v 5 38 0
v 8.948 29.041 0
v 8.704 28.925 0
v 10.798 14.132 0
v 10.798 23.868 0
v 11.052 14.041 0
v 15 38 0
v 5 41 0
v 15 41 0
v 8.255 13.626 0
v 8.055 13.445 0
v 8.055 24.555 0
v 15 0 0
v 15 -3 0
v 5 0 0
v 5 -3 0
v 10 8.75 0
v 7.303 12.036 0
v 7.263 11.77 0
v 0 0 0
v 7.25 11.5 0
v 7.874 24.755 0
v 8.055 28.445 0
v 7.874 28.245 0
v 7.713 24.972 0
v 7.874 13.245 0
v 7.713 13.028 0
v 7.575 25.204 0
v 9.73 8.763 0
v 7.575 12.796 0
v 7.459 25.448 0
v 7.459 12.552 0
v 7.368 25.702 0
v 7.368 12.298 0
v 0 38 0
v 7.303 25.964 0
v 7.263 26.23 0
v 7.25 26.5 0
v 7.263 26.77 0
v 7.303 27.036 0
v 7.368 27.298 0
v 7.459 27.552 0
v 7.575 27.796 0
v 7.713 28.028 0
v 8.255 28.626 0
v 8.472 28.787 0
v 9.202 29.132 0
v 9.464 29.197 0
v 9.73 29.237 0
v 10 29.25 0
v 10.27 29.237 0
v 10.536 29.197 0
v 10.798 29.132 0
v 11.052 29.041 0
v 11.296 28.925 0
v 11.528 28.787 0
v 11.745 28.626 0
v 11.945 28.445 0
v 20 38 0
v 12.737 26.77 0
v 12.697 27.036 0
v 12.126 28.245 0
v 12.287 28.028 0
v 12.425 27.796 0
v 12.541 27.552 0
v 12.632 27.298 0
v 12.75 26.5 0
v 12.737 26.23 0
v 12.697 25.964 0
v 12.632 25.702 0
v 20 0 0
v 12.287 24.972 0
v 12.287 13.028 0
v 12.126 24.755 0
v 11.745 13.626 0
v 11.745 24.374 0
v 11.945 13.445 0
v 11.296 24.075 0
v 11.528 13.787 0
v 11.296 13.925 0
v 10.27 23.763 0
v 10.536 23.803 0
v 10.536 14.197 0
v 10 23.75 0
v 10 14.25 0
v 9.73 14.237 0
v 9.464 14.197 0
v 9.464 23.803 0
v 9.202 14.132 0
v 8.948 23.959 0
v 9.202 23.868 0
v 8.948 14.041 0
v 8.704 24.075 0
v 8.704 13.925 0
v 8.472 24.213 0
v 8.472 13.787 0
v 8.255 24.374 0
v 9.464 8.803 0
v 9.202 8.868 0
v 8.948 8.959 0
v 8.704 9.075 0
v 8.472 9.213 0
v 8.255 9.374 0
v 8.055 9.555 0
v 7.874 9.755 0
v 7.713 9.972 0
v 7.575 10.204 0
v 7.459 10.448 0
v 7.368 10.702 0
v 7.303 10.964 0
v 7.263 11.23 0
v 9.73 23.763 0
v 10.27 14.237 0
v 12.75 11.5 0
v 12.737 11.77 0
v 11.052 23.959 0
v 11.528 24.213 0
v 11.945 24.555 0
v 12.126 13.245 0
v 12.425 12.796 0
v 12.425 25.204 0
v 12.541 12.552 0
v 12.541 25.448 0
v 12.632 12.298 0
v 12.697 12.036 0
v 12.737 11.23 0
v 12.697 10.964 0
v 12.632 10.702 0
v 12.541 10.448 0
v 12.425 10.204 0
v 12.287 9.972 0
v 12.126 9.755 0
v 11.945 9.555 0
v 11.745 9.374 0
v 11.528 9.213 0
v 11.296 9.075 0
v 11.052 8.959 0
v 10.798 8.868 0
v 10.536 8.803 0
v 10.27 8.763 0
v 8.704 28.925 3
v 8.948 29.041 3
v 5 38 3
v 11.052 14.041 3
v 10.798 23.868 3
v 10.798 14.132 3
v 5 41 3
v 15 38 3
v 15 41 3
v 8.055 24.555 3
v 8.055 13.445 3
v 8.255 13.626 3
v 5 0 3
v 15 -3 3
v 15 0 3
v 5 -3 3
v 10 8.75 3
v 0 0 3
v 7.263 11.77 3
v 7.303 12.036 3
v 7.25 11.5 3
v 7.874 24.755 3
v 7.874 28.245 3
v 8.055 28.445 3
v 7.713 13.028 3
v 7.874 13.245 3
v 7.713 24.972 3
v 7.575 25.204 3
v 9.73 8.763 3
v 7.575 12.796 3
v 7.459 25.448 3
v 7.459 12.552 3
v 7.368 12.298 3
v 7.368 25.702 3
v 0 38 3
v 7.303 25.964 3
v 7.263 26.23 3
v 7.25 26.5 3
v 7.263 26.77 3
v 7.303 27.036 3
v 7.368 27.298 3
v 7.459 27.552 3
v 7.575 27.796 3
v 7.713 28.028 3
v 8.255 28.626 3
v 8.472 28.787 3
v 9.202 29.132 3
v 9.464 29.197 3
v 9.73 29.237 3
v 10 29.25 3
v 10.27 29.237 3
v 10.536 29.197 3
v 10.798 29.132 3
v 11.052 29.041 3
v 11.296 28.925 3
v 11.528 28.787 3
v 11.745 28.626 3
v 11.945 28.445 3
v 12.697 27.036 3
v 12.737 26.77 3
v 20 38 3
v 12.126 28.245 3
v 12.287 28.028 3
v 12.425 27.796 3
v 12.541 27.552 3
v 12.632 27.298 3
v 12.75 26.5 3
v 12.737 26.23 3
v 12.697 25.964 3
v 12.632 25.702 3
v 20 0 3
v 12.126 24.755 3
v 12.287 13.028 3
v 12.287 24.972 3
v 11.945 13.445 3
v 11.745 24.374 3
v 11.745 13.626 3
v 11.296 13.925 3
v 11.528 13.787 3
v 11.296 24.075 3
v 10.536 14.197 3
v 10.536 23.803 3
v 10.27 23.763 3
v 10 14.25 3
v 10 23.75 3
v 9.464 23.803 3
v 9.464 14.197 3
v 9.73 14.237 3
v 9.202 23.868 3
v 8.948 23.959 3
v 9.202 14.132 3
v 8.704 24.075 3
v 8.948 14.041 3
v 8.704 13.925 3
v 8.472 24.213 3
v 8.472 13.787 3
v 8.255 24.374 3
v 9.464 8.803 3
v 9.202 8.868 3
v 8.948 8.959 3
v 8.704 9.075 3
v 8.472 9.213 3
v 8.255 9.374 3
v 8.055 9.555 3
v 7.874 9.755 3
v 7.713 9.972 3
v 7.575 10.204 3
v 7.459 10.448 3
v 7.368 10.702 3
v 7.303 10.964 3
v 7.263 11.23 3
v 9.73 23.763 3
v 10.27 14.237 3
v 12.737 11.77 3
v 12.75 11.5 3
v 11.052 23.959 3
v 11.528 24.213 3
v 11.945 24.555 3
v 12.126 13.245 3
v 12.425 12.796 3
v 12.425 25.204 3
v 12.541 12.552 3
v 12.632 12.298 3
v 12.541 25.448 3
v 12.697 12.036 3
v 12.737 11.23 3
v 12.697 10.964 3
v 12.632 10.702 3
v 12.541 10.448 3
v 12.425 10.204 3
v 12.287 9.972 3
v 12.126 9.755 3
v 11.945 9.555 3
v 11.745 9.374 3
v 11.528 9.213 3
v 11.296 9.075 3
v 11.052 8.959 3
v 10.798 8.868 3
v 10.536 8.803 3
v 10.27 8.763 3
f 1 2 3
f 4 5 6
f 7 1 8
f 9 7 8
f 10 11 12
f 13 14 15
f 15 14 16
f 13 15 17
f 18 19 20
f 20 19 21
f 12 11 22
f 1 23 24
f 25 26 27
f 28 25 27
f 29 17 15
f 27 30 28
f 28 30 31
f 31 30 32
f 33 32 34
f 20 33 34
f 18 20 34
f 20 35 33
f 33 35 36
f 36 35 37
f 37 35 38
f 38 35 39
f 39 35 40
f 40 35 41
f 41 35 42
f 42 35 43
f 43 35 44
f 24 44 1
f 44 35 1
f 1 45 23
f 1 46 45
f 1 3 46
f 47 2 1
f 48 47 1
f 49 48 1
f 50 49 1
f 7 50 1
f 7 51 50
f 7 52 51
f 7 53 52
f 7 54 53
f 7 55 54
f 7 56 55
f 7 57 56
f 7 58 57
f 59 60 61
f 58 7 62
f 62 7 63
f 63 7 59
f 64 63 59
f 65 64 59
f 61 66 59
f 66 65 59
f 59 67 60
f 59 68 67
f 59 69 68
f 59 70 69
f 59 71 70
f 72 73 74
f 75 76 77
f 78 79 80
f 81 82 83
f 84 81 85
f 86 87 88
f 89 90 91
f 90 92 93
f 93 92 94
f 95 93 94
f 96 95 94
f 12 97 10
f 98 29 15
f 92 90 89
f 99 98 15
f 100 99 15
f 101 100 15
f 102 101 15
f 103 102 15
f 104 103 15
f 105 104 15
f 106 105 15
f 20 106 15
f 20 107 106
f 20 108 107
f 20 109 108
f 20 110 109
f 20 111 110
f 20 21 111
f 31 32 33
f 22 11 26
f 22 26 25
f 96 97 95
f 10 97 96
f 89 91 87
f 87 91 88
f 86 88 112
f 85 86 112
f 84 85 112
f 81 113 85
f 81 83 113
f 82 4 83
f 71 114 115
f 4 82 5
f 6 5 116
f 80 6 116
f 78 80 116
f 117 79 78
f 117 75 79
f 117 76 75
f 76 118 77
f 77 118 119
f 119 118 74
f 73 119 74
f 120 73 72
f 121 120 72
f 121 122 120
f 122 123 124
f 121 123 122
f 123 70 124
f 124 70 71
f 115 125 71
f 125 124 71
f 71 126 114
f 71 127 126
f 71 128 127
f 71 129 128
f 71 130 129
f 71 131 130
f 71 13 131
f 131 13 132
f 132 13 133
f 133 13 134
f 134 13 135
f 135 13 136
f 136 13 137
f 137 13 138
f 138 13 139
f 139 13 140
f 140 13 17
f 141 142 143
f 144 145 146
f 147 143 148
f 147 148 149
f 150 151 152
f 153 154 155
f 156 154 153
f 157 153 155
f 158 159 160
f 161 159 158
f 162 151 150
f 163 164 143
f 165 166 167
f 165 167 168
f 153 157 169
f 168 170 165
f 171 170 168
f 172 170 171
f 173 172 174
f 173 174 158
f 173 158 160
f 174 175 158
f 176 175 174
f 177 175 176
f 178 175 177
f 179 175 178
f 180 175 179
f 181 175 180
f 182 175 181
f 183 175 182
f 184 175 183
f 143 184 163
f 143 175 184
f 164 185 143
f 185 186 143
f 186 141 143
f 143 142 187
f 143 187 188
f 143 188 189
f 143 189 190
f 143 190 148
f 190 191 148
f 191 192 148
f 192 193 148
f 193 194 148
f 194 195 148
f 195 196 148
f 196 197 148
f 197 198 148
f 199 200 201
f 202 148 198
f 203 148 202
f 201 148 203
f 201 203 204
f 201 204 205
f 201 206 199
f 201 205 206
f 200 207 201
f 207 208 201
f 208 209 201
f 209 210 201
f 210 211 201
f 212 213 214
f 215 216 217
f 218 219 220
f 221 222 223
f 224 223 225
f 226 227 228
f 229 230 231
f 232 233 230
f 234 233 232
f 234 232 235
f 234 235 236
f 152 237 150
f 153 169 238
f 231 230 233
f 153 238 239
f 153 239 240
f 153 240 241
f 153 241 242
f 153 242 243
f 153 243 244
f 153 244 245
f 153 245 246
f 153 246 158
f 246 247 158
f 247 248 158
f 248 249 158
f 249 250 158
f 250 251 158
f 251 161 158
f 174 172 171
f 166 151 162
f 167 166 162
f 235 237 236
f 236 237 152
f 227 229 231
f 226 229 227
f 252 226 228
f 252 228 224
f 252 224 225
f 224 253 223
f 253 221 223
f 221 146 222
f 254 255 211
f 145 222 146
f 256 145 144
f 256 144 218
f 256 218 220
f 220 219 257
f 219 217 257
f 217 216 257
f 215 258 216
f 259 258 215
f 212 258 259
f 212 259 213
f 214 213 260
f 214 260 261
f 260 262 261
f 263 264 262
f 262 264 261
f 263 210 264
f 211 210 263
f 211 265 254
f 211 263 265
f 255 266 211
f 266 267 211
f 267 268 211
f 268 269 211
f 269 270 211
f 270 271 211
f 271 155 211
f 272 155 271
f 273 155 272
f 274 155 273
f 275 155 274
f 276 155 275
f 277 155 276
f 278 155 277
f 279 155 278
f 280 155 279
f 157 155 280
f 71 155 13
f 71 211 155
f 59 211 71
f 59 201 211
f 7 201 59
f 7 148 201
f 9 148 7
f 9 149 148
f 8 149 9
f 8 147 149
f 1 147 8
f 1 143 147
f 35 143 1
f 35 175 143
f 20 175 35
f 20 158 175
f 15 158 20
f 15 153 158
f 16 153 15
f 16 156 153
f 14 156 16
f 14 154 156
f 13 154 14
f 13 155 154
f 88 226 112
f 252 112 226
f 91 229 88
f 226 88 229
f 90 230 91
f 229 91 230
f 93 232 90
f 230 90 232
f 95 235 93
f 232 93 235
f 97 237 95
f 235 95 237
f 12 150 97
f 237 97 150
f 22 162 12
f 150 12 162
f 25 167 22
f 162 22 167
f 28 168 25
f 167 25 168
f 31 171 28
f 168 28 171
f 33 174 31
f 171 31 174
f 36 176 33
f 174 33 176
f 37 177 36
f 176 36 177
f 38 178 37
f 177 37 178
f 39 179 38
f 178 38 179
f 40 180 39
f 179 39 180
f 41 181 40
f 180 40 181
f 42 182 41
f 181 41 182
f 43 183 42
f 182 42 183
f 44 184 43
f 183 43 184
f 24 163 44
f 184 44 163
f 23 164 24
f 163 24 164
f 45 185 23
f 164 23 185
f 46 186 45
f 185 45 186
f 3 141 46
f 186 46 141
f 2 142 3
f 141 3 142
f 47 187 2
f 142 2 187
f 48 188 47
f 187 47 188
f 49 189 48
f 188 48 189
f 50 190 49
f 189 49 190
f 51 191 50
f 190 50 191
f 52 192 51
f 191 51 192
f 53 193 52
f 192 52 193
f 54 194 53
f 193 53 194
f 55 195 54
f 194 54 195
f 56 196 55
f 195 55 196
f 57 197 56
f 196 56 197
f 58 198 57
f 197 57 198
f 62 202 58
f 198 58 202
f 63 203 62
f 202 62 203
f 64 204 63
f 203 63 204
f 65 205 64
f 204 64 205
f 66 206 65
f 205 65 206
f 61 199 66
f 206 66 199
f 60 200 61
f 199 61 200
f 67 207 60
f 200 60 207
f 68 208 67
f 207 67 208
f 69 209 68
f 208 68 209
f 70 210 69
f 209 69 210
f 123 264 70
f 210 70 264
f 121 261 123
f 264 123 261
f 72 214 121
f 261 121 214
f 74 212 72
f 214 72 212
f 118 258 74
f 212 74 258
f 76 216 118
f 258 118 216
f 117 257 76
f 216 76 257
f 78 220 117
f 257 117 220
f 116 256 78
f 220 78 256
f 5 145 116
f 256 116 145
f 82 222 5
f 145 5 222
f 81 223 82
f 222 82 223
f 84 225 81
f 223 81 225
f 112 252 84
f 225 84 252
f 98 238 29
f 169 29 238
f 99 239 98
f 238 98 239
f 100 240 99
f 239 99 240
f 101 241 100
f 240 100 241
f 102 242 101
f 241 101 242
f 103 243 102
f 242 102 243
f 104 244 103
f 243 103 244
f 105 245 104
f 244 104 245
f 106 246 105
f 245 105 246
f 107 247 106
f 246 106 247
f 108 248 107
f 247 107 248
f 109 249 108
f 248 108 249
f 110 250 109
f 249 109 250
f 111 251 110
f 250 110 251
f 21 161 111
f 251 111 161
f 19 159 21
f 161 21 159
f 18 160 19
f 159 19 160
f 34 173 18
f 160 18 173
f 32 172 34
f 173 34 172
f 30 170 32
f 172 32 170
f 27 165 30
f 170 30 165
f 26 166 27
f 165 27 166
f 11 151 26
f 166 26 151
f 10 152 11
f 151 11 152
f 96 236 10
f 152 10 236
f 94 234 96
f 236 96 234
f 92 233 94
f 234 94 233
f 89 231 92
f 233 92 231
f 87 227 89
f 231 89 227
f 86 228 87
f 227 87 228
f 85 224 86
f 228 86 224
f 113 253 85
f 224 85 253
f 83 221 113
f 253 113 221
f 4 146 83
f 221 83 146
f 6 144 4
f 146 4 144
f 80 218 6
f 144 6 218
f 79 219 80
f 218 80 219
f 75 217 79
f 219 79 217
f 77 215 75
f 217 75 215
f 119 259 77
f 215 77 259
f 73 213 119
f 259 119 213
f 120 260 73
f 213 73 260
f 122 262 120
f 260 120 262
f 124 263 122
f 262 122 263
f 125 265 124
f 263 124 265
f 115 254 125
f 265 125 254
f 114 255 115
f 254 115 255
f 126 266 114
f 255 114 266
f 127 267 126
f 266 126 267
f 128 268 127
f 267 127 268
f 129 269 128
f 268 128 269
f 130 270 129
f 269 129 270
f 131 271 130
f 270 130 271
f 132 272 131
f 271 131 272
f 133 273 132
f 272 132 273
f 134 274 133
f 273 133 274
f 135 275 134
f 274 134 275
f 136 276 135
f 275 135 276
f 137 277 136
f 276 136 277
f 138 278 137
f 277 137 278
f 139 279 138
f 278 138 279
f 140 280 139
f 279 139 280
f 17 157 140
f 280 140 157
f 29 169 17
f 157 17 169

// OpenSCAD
// Metal Components/Steel Parts/3mm Load Cell Mounting Plate x2.scad
// Thickness: 3mm

$fn = 64; // High resolution for smooth holes

module 3mm_Load_Cell_Mounting_Plate() {
    // Exact polygon points traced CCW from the DXF
    poly_points = [
        [0, 0],
        [5, 0],
        [5, -3],
        [15, -3],
        [15, 0],
        [20, 0],
        [20, 38],
        [15, 38],
        [15, 41],
        [5, 41],
        [5, 38],
        [0, 38]
    ];

    linear_extrude(height = 3) {
        difference() {
            // Main body
            polygon(poly_points);
            
            // Subtracted Holes (Radius 2.75 -> 5.5mm Dia)
            translate([10, 11.5]) circle(r = 2.75);
            translate([10, 26.5]) circle(r = 2.75);
        }
    }
}

// Render the part
3mm_Load_Cell_Mounting_Plate();
